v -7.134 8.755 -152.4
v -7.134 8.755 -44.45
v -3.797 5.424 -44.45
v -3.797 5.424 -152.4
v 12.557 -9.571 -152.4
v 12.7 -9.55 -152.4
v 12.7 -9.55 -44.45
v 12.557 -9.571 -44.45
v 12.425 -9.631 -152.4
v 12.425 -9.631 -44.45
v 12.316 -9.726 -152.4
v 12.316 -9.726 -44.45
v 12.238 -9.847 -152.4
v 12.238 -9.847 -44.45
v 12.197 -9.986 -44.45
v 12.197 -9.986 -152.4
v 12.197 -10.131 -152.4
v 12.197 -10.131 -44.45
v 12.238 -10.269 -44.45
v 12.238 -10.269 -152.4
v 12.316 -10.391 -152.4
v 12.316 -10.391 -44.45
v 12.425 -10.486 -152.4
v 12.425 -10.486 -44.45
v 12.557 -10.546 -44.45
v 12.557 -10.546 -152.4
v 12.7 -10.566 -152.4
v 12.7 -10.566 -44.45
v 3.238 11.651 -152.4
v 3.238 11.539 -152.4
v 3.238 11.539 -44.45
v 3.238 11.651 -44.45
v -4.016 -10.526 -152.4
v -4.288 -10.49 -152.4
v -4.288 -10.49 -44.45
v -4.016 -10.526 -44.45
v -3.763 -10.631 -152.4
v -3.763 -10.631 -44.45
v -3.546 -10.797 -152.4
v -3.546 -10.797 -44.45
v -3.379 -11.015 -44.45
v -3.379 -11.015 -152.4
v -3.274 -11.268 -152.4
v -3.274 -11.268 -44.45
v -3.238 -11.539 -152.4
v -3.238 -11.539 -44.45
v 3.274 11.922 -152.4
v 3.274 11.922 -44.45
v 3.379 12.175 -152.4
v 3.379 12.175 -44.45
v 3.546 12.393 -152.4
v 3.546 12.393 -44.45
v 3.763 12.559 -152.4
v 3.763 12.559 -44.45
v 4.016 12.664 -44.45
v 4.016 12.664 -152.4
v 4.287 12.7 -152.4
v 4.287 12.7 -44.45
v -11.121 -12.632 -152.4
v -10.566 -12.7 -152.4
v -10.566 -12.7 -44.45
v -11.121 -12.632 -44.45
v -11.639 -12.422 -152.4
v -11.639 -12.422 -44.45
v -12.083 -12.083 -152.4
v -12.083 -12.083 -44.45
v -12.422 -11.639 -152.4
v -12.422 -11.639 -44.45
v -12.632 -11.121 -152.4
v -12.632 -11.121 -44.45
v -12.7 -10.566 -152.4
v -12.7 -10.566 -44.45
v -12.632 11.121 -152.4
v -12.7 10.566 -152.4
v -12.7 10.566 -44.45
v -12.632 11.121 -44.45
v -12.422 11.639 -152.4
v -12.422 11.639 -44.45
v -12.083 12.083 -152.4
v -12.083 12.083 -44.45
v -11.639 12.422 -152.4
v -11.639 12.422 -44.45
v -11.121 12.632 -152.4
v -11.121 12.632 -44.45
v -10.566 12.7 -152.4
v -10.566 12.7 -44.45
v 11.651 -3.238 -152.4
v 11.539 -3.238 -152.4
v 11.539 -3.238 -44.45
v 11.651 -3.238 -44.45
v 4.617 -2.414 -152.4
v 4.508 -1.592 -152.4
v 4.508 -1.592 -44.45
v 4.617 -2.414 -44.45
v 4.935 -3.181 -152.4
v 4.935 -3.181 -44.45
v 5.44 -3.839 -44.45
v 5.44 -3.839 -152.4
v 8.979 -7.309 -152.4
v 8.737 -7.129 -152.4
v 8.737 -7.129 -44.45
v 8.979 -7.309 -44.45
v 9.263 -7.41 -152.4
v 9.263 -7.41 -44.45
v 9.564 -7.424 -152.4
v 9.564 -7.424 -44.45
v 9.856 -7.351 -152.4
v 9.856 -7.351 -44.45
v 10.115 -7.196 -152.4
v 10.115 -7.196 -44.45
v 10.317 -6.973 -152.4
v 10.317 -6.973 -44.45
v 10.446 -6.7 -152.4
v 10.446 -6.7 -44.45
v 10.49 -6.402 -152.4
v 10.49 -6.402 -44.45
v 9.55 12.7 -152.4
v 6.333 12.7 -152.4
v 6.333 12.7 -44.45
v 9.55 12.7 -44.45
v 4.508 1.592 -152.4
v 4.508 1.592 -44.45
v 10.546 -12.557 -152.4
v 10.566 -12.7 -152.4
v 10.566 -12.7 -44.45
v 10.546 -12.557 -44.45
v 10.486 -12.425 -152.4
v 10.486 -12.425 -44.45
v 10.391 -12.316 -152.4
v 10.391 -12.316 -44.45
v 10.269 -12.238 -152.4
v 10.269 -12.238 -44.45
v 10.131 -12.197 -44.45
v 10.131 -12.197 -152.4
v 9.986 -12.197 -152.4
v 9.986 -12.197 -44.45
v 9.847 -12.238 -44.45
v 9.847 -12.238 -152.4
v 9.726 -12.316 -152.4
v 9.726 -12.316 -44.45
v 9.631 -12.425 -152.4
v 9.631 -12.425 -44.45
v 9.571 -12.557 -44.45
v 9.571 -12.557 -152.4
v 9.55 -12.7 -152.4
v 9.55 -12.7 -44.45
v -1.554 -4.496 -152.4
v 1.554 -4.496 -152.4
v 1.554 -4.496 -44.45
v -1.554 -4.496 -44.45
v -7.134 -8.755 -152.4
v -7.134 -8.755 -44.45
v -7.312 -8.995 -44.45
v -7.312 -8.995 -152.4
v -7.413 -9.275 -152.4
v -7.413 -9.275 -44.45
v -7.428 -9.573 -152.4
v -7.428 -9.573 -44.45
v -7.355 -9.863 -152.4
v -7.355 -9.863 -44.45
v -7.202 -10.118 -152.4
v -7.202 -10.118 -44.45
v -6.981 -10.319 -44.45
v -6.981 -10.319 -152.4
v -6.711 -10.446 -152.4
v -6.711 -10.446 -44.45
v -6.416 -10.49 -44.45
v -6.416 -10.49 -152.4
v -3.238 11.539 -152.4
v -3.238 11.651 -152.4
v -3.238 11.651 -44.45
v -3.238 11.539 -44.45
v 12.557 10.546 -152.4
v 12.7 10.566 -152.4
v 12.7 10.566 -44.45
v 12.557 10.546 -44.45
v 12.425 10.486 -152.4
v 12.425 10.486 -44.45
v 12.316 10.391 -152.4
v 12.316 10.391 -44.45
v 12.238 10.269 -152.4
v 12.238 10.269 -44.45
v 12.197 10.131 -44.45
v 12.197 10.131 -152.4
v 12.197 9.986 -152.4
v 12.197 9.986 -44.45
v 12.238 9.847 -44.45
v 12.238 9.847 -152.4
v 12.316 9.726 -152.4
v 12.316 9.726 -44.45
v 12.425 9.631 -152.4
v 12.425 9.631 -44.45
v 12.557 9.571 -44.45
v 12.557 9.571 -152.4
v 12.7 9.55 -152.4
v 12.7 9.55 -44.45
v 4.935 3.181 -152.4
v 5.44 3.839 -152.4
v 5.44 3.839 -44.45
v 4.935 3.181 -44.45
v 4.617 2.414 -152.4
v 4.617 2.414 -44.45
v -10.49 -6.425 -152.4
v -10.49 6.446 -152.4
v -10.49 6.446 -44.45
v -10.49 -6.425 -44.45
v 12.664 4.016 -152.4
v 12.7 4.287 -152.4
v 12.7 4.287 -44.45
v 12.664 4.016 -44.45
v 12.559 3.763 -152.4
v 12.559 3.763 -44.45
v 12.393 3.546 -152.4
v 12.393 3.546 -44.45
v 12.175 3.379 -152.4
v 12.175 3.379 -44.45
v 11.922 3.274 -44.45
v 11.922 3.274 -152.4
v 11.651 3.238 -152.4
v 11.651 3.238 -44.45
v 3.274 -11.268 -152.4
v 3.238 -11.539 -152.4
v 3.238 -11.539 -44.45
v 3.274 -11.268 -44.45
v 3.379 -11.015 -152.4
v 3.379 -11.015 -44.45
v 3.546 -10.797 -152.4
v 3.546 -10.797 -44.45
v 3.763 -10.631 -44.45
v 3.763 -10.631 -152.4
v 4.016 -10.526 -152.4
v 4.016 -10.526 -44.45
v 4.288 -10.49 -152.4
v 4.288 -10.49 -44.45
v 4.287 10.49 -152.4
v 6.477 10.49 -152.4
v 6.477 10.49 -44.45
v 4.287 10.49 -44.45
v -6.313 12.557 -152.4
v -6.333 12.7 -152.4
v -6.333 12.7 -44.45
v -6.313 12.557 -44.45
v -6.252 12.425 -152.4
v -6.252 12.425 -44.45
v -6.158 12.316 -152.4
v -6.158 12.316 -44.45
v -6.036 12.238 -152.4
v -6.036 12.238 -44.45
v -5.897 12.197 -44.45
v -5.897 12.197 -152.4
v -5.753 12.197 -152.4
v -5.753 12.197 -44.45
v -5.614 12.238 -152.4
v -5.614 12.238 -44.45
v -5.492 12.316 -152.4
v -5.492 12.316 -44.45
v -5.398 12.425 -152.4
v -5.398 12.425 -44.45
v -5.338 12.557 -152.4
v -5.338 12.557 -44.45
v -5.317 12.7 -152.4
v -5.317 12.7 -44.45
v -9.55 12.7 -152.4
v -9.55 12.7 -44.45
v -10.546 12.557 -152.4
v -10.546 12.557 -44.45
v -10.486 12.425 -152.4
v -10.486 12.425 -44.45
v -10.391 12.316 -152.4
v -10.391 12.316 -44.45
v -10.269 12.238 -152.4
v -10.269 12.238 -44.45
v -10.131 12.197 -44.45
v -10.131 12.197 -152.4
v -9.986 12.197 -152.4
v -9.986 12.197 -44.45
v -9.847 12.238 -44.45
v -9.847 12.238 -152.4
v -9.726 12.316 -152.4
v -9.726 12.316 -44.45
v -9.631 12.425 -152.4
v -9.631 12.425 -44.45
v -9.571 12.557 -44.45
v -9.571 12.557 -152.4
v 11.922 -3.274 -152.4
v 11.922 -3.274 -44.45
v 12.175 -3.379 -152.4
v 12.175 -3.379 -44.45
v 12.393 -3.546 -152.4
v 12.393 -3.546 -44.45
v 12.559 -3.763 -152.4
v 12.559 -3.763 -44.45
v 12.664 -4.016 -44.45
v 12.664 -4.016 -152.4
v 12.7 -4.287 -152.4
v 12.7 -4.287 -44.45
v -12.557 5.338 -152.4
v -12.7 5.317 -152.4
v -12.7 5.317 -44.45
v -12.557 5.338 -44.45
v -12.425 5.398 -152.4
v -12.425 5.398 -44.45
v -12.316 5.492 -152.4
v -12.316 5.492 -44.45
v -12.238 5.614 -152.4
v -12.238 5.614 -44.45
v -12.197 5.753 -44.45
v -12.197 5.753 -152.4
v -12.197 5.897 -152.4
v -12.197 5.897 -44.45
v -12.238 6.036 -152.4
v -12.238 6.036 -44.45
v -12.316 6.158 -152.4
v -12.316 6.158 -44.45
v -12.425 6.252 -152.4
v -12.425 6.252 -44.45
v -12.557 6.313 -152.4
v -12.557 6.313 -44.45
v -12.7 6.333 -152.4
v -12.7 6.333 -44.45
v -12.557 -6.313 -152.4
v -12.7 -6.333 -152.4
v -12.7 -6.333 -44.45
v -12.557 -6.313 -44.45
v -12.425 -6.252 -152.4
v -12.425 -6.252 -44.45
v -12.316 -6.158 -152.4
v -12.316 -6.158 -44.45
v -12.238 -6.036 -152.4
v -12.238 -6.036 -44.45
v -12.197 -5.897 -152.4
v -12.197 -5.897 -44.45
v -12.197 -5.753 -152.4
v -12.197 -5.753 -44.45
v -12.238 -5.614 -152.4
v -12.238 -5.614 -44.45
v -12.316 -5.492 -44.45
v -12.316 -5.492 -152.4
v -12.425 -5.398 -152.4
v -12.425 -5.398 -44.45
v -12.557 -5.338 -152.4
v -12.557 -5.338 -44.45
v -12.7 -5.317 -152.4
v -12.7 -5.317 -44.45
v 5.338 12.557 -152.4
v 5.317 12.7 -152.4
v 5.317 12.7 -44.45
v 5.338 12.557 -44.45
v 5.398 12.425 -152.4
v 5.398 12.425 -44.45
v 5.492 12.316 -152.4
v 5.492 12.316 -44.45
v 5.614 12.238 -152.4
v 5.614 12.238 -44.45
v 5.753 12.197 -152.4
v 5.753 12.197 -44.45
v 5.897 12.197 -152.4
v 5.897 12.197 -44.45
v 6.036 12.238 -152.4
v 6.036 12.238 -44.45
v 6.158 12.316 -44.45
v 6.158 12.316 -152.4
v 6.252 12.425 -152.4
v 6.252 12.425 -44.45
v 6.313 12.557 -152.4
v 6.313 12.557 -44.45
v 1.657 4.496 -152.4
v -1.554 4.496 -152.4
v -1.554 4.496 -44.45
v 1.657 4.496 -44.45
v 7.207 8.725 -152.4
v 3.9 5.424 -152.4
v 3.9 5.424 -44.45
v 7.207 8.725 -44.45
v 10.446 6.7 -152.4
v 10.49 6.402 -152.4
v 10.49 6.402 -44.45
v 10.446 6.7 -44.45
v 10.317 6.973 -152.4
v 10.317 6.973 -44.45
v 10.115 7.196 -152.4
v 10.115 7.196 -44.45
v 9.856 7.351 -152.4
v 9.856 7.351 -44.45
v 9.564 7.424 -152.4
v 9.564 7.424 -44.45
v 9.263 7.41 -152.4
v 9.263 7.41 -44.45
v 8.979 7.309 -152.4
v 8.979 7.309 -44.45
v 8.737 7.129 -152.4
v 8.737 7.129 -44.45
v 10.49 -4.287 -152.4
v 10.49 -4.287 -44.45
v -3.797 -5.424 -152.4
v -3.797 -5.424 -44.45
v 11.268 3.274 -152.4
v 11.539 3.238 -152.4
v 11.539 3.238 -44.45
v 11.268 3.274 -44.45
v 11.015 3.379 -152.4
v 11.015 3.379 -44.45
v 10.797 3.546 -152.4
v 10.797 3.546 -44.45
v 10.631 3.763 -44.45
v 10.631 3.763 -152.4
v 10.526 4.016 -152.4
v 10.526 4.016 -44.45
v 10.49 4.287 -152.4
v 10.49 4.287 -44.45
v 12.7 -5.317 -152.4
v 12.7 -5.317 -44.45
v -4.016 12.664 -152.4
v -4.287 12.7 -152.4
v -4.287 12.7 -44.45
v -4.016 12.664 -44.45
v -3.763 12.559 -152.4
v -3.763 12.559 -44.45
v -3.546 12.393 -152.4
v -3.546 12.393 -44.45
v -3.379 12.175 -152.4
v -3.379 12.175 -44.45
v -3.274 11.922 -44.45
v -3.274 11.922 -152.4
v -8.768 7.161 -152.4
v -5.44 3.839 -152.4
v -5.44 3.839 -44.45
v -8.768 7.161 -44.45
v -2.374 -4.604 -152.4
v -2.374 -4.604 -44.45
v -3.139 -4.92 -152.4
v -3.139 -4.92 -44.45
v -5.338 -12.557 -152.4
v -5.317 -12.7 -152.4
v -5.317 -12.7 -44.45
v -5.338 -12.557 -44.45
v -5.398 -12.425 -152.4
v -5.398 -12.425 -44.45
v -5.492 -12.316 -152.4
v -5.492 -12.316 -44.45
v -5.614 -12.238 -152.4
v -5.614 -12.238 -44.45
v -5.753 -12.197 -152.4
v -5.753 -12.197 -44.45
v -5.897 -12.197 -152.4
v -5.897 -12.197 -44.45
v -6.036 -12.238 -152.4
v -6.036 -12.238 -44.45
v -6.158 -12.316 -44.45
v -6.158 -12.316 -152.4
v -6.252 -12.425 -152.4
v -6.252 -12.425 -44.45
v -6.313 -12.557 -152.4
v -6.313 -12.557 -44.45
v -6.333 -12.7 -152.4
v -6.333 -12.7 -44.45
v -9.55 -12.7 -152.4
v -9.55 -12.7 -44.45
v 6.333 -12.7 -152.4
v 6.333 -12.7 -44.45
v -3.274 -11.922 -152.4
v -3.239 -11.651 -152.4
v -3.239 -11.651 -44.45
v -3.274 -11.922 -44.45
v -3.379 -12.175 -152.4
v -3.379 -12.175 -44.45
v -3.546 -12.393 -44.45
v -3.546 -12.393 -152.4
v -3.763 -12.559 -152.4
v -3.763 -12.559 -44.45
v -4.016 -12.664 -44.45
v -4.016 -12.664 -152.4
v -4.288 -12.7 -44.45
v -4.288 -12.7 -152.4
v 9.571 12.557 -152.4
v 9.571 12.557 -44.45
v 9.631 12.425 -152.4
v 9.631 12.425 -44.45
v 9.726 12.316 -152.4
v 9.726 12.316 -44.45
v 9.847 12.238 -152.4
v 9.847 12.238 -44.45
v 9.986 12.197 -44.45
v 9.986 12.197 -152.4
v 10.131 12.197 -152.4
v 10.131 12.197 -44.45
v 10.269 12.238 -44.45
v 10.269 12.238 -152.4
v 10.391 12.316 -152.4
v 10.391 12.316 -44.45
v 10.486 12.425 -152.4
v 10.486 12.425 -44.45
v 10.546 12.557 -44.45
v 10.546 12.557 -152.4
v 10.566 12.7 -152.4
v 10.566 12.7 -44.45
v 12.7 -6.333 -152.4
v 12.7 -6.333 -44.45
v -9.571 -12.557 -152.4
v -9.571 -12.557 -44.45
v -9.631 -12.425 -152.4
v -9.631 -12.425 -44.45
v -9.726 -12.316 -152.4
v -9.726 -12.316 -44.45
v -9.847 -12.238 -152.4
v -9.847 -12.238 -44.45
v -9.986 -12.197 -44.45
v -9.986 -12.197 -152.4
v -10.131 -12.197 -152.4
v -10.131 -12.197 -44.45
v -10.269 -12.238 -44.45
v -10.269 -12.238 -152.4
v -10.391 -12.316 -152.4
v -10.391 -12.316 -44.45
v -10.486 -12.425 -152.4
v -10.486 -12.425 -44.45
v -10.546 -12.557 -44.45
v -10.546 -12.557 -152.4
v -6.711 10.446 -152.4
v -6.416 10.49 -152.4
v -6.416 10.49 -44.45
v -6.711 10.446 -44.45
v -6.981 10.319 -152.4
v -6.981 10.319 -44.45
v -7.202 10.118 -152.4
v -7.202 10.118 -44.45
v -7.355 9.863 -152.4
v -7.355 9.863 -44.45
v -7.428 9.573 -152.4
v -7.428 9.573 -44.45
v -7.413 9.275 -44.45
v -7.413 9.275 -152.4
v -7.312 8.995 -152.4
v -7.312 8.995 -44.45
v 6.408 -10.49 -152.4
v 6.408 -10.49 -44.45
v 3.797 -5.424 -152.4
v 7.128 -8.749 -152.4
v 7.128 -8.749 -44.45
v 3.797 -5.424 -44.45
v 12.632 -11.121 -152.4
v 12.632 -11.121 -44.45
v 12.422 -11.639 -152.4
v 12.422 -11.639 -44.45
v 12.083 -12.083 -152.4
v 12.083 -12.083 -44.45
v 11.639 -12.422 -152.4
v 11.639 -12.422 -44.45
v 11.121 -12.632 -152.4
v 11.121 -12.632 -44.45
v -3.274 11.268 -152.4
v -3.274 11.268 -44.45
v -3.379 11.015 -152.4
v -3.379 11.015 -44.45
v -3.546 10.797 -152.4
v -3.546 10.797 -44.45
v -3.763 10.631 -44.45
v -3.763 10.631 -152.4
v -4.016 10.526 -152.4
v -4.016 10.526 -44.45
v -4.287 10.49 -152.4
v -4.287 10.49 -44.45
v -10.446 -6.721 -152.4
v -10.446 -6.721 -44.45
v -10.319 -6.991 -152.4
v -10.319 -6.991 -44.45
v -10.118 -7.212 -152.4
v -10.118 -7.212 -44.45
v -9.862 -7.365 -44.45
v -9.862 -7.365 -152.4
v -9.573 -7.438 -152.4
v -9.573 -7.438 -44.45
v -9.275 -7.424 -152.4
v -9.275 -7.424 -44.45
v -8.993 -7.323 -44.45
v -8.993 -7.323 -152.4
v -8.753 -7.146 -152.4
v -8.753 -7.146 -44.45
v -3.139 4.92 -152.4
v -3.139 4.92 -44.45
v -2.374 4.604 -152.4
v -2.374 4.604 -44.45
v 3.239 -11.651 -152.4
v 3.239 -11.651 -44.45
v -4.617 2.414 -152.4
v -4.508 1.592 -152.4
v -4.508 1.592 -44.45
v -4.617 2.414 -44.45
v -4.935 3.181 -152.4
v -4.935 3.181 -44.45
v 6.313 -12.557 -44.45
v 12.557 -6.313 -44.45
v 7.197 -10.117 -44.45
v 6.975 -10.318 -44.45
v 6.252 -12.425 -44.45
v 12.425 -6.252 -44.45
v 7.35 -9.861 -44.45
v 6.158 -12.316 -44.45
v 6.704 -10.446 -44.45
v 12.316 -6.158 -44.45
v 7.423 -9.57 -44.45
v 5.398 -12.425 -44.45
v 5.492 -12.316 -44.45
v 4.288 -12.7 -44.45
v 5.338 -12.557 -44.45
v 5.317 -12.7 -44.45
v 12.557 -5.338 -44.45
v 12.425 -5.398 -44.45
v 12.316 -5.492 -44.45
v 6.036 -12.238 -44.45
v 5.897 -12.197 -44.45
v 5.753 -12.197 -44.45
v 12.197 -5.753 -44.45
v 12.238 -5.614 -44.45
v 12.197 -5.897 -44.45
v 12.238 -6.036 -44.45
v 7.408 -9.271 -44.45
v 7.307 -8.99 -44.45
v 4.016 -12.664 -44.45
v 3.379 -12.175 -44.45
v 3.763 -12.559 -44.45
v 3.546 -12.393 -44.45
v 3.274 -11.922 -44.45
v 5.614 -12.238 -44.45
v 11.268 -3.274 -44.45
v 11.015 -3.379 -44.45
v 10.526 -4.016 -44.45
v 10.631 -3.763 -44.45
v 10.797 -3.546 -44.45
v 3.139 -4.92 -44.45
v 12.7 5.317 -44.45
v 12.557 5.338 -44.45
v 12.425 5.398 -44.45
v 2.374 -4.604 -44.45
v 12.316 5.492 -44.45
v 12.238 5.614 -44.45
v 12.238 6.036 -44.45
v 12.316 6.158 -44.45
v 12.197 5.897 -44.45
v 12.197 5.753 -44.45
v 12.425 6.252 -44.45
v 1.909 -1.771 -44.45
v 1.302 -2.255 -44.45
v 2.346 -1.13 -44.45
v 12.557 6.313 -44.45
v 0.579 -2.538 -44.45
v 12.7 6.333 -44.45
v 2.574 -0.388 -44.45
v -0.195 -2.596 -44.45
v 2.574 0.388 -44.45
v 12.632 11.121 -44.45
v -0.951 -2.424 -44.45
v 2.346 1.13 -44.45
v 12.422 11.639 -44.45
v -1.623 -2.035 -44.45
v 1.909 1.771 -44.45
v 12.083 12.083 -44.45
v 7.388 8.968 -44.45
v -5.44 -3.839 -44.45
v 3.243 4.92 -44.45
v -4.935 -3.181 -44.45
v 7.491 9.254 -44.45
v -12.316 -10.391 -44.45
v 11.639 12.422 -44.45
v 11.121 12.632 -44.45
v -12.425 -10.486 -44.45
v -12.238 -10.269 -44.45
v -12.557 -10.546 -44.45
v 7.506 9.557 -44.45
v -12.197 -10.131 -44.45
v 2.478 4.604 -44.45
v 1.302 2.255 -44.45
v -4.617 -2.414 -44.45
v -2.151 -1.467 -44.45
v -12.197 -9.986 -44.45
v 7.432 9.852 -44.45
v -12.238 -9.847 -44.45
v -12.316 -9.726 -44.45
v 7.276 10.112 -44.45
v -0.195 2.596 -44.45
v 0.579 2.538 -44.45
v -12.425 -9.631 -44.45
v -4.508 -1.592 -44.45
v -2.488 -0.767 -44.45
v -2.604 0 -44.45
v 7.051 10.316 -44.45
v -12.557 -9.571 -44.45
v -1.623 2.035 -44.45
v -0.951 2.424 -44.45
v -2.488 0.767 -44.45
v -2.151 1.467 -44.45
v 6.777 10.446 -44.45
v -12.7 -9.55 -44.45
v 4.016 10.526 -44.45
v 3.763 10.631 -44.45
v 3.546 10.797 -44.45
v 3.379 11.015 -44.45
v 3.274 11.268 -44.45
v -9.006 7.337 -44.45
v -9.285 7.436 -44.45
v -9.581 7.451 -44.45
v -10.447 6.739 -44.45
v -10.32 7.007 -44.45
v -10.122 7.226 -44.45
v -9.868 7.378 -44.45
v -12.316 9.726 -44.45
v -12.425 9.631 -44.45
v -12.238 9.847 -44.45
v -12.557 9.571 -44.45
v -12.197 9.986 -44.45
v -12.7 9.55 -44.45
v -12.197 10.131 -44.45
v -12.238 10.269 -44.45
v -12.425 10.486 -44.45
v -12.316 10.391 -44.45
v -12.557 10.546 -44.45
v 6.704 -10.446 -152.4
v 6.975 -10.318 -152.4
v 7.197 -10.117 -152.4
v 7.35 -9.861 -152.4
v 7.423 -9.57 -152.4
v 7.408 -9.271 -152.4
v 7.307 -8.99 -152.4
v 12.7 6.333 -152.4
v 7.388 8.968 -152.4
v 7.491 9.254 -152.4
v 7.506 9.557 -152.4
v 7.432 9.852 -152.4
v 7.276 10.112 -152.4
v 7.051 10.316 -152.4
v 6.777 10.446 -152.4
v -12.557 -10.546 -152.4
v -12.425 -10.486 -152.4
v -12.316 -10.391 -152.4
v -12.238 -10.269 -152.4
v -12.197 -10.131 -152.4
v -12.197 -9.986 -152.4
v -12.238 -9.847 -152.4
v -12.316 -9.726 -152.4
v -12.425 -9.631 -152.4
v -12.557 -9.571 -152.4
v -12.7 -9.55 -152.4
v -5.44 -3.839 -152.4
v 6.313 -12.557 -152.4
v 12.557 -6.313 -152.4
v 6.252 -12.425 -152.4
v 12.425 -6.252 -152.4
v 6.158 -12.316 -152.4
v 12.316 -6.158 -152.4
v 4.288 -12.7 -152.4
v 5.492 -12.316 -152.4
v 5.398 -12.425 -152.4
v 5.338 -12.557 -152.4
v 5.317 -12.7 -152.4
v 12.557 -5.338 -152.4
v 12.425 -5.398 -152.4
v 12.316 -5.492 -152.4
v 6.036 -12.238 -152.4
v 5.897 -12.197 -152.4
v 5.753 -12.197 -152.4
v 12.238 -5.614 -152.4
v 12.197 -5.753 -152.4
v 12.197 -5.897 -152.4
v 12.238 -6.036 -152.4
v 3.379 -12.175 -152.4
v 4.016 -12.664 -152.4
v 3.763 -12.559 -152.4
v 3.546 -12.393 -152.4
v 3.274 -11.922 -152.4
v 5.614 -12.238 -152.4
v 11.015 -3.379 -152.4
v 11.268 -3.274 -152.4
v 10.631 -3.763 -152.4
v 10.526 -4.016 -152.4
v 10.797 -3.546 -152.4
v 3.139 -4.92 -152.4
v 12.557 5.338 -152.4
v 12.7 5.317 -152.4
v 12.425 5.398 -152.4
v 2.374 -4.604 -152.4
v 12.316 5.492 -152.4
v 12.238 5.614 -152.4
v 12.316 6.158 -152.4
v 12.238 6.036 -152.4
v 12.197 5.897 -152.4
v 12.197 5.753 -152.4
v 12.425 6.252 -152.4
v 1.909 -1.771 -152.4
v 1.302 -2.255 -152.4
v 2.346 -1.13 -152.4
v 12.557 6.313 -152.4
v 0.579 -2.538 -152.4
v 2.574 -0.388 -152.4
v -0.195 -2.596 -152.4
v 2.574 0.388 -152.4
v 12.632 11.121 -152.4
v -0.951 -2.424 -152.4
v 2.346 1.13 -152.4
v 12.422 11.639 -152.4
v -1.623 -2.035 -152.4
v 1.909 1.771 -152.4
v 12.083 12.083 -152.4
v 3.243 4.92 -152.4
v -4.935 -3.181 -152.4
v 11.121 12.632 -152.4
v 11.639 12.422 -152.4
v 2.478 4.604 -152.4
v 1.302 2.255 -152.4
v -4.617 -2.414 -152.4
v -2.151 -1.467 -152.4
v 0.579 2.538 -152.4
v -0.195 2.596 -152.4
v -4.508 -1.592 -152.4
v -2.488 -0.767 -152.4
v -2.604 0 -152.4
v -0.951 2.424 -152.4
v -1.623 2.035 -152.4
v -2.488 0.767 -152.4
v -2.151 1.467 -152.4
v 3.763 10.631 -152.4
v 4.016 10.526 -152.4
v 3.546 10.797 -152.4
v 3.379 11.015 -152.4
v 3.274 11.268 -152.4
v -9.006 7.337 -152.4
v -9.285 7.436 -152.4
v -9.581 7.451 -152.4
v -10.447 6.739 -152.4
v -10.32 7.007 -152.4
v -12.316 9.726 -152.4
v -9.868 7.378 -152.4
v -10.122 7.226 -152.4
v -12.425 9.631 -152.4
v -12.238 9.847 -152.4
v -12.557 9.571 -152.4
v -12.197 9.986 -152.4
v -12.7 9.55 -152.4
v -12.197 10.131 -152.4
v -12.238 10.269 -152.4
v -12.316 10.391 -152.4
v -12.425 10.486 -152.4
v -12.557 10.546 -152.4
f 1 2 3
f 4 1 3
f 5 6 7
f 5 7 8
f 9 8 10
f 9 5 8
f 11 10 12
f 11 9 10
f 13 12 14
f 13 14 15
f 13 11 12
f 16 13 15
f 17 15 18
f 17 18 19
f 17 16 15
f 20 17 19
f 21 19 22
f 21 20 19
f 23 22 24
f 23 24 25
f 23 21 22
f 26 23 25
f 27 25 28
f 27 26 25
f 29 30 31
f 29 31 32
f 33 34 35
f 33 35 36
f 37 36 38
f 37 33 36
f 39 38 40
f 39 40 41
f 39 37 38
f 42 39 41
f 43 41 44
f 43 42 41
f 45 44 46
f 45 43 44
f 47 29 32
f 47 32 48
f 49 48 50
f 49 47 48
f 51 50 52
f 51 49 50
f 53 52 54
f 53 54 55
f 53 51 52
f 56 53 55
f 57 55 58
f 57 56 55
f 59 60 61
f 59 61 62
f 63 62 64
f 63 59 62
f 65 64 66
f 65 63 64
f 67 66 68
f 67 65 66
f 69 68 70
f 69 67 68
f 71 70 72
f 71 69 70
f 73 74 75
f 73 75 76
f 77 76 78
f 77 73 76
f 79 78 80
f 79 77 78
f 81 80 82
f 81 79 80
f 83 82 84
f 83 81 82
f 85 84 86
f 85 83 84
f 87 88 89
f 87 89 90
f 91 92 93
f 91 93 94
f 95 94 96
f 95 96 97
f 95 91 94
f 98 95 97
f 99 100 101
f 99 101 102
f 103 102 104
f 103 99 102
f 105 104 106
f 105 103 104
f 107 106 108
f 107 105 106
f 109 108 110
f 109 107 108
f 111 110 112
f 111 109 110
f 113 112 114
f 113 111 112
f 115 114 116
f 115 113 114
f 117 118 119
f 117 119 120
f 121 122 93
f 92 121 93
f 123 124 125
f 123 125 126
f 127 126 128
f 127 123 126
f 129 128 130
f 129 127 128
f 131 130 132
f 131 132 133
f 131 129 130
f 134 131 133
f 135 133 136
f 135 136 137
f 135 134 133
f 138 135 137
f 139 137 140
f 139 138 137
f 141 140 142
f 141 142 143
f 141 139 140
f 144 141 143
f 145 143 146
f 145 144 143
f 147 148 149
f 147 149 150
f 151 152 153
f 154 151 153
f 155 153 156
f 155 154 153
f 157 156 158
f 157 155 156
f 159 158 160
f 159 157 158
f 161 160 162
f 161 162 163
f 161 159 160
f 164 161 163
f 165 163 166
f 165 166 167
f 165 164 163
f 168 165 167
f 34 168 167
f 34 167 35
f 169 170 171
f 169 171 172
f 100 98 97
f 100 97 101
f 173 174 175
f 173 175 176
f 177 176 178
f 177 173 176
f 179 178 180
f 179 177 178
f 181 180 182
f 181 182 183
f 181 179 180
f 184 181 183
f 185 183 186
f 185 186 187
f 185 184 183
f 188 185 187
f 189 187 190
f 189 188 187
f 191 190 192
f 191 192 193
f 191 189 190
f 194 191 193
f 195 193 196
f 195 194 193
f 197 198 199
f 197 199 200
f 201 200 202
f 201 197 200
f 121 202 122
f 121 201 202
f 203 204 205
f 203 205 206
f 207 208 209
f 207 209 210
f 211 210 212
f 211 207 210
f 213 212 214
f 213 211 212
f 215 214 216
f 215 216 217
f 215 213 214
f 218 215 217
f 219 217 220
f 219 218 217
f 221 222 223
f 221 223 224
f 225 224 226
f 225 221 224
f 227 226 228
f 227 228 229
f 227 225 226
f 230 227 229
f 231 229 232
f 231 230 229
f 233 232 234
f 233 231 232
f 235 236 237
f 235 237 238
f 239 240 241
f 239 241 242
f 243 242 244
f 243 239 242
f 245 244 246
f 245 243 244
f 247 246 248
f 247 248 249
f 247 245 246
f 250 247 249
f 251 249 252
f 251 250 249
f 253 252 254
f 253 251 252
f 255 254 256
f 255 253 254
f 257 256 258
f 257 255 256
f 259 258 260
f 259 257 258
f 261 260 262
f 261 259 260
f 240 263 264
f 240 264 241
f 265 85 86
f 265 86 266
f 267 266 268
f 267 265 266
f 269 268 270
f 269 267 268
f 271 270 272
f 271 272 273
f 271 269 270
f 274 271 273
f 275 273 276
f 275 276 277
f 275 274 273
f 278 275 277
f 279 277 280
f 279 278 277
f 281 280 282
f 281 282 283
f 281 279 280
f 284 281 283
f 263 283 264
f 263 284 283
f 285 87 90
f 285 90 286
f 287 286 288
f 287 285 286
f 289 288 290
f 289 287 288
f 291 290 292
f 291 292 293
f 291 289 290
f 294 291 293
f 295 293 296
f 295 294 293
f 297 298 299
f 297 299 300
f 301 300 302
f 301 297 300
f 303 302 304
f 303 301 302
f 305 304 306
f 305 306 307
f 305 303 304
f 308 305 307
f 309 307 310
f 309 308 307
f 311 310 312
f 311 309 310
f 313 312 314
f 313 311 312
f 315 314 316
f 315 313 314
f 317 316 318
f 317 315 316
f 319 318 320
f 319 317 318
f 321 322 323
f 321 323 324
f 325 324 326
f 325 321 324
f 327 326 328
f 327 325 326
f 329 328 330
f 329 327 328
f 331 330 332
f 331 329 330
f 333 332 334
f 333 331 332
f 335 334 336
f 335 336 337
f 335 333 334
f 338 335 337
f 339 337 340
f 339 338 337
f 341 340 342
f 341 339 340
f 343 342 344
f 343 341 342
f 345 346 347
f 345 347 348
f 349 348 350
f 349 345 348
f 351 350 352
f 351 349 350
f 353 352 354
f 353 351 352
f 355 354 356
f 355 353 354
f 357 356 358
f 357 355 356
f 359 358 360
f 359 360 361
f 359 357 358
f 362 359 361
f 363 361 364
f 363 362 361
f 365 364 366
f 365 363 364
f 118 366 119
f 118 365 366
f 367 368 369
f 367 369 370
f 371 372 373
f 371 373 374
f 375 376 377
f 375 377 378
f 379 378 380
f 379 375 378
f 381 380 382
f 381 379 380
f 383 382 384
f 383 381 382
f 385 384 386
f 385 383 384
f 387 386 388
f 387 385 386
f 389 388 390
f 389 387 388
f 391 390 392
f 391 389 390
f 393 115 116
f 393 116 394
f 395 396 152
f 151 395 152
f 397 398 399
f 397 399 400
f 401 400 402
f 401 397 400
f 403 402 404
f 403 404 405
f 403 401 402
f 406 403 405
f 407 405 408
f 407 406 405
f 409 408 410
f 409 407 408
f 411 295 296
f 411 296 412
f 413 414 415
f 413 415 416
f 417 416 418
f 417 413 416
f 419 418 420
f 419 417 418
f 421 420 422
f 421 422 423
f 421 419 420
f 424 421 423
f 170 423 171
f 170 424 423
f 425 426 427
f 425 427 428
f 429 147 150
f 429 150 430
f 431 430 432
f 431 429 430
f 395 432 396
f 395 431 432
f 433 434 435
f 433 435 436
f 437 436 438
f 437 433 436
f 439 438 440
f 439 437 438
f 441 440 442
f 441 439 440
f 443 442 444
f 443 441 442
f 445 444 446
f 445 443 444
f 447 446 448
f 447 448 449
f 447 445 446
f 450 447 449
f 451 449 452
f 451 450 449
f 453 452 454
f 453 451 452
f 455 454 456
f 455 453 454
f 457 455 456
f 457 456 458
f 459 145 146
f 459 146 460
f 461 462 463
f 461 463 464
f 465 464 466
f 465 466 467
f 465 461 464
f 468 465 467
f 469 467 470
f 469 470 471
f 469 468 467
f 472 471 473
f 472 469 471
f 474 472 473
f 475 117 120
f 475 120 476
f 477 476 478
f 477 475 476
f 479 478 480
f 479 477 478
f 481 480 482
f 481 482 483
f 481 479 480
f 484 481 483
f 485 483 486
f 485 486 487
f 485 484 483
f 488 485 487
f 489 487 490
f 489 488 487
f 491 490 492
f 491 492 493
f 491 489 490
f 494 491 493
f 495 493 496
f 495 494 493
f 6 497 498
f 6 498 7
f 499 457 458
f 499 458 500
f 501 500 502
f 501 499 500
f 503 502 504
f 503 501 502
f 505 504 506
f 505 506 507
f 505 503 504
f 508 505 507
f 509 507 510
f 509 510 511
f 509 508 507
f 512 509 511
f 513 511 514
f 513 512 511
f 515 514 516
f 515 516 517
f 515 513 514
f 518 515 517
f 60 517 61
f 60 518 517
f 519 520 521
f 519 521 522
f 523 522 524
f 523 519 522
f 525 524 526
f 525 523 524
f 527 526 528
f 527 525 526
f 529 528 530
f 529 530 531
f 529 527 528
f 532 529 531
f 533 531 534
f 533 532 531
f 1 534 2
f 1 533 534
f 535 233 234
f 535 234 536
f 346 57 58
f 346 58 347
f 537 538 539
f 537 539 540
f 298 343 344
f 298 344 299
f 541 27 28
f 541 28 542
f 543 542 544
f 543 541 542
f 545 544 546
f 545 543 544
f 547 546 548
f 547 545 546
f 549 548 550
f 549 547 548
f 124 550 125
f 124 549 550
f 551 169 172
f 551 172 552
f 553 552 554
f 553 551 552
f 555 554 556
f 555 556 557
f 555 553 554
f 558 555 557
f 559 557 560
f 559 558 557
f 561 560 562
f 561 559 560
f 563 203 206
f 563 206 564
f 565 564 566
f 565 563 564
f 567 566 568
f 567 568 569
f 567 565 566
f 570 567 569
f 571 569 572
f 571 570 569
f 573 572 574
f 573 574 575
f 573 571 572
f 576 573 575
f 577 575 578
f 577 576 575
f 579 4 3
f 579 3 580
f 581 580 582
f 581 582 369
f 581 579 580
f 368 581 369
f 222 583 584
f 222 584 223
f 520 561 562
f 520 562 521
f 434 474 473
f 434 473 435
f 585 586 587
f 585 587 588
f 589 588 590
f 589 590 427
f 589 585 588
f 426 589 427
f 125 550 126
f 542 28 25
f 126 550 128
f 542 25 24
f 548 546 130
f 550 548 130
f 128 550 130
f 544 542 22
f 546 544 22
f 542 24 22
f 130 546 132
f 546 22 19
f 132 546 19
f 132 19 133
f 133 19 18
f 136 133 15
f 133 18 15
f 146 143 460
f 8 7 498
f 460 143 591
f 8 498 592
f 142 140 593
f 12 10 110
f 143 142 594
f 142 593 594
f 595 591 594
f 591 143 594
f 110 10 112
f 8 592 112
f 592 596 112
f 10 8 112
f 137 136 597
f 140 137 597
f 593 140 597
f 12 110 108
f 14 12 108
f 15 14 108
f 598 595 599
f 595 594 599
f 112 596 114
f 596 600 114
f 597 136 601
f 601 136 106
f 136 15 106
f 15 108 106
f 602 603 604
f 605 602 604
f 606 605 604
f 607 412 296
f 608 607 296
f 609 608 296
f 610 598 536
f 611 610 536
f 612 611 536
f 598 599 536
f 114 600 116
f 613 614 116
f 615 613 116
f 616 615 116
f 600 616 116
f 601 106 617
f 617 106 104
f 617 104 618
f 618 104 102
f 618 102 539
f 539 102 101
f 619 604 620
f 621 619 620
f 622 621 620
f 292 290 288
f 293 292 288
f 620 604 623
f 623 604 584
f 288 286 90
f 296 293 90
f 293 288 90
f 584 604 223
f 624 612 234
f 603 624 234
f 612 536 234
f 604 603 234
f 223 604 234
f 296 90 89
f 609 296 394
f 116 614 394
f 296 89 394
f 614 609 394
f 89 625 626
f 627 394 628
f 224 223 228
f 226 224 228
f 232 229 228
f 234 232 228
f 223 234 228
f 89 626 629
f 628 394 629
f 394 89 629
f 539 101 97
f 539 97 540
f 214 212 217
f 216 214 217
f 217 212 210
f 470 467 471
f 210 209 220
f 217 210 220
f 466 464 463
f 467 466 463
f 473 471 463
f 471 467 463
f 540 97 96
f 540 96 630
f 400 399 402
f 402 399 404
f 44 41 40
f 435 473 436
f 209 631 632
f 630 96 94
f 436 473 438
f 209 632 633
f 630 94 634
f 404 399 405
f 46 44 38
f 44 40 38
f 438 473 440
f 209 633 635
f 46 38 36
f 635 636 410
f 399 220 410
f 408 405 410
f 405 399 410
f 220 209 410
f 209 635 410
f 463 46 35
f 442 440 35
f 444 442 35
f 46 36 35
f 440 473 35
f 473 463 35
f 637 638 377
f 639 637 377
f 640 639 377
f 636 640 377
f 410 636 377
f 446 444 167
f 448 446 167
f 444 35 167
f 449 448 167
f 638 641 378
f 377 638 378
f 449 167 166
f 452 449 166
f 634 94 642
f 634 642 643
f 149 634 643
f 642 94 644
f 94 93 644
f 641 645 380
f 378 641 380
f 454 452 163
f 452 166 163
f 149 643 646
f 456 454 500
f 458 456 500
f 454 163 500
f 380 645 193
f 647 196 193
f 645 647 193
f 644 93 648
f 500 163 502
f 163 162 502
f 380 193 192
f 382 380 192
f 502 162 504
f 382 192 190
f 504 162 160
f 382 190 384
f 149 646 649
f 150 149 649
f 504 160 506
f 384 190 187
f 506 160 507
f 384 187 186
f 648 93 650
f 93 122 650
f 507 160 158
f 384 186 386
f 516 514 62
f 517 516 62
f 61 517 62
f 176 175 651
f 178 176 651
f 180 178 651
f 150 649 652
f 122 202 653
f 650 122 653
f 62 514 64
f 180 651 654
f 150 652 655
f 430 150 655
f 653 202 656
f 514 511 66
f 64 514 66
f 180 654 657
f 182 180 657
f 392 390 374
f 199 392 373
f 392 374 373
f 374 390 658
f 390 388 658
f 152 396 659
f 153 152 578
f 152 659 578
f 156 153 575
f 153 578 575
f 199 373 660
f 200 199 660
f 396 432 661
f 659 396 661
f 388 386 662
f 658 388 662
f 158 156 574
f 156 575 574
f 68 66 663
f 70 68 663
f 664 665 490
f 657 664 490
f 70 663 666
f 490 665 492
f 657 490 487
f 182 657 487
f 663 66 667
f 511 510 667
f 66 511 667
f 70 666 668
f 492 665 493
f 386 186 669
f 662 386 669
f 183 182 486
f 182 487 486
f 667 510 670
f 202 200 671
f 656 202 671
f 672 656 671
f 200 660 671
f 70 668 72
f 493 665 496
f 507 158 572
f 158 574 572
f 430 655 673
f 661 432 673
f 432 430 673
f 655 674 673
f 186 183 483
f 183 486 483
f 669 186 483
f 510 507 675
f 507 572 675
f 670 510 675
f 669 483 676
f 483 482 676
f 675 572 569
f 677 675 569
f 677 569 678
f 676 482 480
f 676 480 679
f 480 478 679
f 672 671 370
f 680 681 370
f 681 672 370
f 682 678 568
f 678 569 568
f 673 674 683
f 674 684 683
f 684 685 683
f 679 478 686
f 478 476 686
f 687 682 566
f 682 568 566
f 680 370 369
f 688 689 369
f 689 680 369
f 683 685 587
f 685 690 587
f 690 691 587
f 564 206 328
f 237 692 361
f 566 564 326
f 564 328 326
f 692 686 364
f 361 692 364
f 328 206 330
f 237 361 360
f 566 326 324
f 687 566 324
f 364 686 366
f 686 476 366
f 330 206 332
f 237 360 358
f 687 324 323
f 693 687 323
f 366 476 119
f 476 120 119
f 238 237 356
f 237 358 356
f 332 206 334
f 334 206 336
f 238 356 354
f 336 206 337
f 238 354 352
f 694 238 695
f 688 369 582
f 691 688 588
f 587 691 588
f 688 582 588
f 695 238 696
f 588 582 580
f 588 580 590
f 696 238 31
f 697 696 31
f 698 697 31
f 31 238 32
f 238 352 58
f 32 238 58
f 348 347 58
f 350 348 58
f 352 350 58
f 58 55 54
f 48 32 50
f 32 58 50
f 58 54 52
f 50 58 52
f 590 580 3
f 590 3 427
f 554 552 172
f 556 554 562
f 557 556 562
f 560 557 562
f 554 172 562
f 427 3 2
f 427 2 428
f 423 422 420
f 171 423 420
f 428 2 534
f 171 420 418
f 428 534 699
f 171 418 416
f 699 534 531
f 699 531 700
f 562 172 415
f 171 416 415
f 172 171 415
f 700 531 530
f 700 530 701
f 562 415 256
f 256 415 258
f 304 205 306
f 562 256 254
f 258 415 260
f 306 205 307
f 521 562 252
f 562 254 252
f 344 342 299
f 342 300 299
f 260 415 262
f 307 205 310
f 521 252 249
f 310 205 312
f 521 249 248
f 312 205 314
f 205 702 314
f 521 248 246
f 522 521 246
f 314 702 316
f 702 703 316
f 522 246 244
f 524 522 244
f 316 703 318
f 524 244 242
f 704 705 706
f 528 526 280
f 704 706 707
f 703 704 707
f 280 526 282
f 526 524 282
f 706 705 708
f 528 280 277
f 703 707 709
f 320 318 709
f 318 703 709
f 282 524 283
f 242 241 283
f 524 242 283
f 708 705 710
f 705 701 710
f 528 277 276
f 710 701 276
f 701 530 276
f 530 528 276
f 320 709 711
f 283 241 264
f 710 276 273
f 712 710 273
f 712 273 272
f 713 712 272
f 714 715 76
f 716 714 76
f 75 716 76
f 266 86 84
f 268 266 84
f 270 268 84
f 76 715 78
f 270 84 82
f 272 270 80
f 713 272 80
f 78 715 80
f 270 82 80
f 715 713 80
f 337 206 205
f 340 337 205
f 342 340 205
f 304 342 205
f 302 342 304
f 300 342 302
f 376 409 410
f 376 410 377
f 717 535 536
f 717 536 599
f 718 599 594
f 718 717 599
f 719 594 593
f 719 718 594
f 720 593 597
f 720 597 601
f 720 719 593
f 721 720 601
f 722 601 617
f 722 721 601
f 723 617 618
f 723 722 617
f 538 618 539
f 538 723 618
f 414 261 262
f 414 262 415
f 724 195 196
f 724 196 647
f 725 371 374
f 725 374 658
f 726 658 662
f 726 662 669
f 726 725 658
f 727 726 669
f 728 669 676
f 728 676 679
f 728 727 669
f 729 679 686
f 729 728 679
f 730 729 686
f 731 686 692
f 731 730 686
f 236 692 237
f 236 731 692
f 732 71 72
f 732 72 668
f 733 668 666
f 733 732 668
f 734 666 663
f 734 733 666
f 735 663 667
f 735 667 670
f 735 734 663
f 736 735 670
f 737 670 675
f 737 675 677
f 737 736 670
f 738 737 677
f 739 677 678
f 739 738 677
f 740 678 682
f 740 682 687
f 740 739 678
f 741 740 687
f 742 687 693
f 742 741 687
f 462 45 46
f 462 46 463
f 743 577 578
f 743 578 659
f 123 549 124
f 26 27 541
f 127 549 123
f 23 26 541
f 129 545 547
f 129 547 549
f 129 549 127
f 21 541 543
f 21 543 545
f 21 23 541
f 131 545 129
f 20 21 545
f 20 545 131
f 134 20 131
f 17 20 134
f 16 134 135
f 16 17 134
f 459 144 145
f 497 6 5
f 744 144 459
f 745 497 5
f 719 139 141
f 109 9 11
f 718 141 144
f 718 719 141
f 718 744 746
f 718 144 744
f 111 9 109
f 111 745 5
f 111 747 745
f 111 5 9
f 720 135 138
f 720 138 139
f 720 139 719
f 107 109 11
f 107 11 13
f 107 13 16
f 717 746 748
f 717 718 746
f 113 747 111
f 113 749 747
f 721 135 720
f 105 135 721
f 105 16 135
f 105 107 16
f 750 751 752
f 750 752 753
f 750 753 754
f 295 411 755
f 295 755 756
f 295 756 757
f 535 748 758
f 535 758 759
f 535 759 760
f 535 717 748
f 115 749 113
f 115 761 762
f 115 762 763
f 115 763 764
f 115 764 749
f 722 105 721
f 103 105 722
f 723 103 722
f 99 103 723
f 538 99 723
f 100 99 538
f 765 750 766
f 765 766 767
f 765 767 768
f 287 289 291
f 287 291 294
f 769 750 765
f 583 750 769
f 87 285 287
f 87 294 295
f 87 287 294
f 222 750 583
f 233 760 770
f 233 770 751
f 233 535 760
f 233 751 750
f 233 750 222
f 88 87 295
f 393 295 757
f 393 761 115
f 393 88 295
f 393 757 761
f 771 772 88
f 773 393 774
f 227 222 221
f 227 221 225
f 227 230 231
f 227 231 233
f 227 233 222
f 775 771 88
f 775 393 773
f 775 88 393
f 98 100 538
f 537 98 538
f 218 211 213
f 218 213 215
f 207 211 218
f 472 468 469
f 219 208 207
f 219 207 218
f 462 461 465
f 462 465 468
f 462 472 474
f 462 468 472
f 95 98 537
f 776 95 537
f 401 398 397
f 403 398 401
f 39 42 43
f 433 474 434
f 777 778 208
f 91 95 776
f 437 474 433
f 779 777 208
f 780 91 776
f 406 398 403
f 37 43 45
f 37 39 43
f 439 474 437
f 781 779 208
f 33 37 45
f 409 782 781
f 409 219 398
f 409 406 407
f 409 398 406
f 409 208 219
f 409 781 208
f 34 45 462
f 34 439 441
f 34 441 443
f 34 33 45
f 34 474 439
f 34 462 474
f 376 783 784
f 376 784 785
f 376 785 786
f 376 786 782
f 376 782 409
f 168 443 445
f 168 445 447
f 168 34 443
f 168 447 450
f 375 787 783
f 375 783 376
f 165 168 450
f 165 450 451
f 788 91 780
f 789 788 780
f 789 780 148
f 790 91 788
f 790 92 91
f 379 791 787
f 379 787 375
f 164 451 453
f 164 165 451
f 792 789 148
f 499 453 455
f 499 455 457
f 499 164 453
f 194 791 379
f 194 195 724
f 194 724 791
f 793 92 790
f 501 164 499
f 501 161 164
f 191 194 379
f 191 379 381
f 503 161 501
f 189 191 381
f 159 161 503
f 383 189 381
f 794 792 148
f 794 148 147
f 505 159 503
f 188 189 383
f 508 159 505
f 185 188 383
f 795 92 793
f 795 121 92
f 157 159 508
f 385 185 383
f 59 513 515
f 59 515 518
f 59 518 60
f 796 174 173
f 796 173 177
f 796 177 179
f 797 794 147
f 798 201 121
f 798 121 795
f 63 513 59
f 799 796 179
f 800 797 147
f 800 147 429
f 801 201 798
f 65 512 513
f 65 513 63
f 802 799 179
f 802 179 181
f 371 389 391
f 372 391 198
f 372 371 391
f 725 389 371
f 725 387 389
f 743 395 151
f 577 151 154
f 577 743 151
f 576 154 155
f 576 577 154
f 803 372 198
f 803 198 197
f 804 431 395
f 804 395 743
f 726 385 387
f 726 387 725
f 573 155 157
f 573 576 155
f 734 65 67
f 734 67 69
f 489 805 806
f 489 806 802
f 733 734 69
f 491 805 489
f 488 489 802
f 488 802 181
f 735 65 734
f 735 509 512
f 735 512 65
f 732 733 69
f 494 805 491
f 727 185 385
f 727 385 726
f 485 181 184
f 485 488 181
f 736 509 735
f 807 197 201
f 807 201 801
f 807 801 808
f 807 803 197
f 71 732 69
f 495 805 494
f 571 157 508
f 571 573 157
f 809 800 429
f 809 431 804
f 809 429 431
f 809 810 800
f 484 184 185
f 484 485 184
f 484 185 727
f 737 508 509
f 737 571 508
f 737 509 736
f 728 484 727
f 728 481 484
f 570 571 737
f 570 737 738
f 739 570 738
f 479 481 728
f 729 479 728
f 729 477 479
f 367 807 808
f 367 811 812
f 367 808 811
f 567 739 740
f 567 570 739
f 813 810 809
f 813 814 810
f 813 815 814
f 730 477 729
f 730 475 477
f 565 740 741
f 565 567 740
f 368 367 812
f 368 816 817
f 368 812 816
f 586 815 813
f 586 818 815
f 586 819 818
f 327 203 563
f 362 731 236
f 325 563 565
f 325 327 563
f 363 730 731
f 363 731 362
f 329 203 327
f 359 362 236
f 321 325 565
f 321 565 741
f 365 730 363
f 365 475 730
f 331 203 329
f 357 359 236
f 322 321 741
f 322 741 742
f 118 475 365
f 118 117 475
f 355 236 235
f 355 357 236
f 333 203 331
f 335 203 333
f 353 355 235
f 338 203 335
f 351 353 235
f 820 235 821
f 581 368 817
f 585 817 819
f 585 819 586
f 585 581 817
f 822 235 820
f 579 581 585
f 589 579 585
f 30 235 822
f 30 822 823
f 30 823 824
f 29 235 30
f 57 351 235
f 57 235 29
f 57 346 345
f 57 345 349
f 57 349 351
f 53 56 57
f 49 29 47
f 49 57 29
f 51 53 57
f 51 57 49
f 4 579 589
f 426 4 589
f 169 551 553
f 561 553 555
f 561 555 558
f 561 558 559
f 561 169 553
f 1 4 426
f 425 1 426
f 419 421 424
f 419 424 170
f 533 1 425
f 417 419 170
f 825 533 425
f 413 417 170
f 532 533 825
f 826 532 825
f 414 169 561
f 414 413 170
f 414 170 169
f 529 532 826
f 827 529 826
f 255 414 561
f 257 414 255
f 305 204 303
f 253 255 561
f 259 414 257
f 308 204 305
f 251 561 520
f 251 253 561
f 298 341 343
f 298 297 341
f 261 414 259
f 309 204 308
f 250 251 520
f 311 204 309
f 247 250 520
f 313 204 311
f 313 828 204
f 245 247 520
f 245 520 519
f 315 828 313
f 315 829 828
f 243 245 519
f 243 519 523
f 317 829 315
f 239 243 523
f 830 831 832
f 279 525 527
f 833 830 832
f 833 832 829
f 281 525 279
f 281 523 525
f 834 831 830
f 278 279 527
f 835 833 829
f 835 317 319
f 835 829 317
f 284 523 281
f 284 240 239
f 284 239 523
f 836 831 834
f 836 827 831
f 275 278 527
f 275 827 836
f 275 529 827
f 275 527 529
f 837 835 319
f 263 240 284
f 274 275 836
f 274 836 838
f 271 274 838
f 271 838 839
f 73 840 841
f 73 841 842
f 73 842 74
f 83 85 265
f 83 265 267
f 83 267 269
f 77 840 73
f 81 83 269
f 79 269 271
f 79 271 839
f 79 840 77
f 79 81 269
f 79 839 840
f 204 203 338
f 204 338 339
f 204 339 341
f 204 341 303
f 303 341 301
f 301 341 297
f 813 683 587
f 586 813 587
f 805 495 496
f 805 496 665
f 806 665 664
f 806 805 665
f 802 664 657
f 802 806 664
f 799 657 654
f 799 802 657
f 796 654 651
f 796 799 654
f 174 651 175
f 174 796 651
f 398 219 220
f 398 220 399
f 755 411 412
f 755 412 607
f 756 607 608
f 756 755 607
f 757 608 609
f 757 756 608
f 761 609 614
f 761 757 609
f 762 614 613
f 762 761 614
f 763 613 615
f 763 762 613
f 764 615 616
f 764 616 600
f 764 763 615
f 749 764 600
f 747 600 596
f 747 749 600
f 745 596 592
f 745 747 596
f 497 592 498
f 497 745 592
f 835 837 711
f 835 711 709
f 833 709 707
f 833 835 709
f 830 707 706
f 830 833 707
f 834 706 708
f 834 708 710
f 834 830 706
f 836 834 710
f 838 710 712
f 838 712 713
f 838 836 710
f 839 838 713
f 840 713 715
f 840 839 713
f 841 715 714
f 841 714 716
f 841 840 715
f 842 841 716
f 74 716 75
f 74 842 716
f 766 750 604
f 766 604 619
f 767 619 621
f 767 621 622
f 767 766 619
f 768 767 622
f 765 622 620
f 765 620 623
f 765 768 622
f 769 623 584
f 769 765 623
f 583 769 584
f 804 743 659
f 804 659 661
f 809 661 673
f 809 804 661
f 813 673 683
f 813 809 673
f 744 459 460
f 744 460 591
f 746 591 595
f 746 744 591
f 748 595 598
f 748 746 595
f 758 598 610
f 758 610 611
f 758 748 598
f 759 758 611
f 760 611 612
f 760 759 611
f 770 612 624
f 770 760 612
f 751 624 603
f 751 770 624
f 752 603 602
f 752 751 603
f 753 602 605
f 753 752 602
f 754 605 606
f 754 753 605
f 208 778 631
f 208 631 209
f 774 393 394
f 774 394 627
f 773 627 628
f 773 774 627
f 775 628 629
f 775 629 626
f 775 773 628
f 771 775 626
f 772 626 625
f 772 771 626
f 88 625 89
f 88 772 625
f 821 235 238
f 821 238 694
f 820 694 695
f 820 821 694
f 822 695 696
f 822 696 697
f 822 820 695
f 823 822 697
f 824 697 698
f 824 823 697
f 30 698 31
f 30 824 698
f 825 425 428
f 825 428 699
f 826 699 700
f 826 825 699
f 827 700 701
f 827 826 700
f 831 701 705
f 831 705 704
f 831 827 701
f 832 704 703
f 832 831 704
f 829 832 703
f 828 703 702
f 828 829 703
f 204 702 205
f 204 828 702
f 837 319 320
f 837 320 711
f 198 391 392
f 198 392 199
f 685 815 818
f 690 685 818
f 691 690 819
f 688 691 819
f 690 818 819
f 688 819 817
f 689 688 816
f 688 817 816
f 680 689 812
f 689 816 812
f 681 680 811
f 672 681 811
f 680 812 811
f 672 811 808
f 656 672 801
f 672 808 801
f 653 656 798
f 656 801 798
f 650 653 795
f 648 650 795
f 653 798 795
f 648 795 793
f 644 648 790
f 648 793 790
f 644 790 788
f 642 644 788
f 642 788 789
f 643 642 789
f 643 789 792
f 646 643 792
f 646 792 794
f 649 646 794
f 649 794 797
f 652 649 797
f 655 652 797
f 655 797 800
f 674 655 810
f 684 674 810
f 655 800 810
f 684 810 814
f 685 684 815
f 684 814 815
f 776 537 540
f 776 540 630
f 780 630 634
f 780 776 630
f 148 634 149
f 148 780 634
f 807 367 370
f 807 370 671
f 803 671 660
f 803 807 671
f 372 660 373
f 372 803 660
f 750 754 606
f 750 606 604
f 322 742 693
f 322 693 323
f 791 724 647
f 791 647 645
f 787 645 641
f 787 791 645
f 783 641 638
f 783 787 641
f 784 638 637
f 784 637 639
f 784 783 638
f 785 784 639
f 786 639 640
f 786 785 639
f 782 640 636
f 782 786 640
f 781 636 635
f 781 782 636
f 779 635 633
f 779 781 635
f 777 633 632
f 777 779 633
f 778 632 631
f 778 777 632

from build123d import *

# Parameters (mm, degrees)
SKETCH1_R           = 2.6035
BOSS_EXTRUDE1_DEPTH = 107.95


with BuildPart() as part:
    # Sketch1 → Boss-Extrude1 (new body)
    with BuildSketch(Plane(origin=(0, 0, -152.4), x_dir=(-1, 0, 0), z_dir=(0, 0, -1))):
        with BuildLine():
            Line((6.416409763, -10.4902), (4.28752, -10.4902))
            ThreePointArc((4.28752, -10.4902), (3.545750844, -10.797450844), (3.2385, -11.53922))
            Line((3.2385, -11.53922), (3.2385, -11.65098))
            ThreePointArc((3.2385, -11.65098), (3.545750844, -12.392749156), (4.28752, -12.7))
            Line((4.28752, -12.7), (5.3170836, -12.7))
            ThreePointArc((5.3170836, -12.7), (5.8250836, -12.192), (6.3330836, -12.7))
            Line((6.3330836, -12.7), (9.5504, -12.7))
            ThreePointArc((9.5504, -12.7), (10.058323491, -12.192000006), (10.566399977, -12.699846982))
            ThreePointArc((10.566399977, -12.699846982), (12.082522516, -12.082522516), (12.699846982, -10.566399977))
            ThreePointArc((12.699846982, -10.566399977), (12.192000006, -10.058323491), (12.7, -9.5504))
            Line((12.7, -9.5504), (12.7, -6.3330836))
            ThreePointArc((12.7, -6.3330836), (12.192, -5.8250836), (12.7, -5.3170836))
            Line((12.7, -5.3170836), (12.7, 5.3171344))
            ThreePointArc((12.7, 5.3171344), (12.192, 5.8251344), (12.7, 6.3331344))
            Line((12.7, 6.3331344), (12.7, 9.5504))
            ThreePointArc((12.7, 9.5504), (12.192000006, 10.058323491), (12.699846982, 10.566399977))
            ThreePointArc((12.699846982, 10.566399977), (12.082522516, 12.082522516), (10.566399977, 12.699846982))
            ThreePointArc((10.566399977, 12.699846982), (10.058323491, 12.192000006), (9.5504, 12.7))
            Line((9.5504, 12.7), (6.3331344, 12.7))
            ThreePointArc((6.3331344, 12.7), (5.8251344, 12.192), (5.3171344, 12.7))
            Line((5.3171344, 12.7), (4.2874692, 12.7))
            ThreePointArc((4.2874692, 12.7), (3.545700044, 12.392749156), (3.2384492, 11.65098))
            Line((3.2384492, 11.65098), (3.2384492, 11.53922))
            ThreePointArc((3.2384492, 11.53922), (3.545700044, 10.797450844), (4.2874692, 10.4902))
            Line((4.2874692, 10.4902), (6.416384363, 10.4902))
            ThreePointArc((6.416384363, 10.4902), (7.355223148, 9.862578342), (7.134149423, 8.755124678))
            Line((7.134149423, 8.755124678), (3.796632915, 5.423689619))
            ThreePointArc((3.796632915, 5.423689619), (2.767299421, 4.736928798), (1.553617102, 4.4958))
            Line((1.553617102, 4.4958), (-1.657299581, 4.4958))
            ThreePointArc((-1.657299581, 4.4958), (-2.8709819, 4.736928798), (-3.900315394, 5.423689619))
            Line((-3.900315394, 5.423689619), (-7.207191475, 8.724540082))
            ThreePointArc((-7.207191475, 8.724540082), (-7.43216212, 9.851515102), (-6.476774195, 10.4902))
            Line((-6.476774195, 10.4902), (-4.2874692, 10.4902))
            ThreePointArc((-4.2874692, 10.4902), (-3.545700044, 10.797450844), (-3.2384492, 11.53922))
            Line((-3.2384492, 11.53922), (-3.2384492, 11.65098))
            ThreePointArc((-3.2384492, 11.65098), (-3.545700044, 12.392749156), (-4.2874692, 12.7))
            Line((-4.2874692, 12.7), (-5.3170836, 12.7))
            ThreePointArc((-5.3170836, 12.7), (-5.8250836, 12.192), (-6.3330836, 12.7))
            Line((-6.3330836, 12.7), (-9.5504, 12.7))
            ThreePointArc((-9.5504, 12.7), (-10.058323491, 12.192000006), (-10.566399977, 12.699846982))
            ThreePointArc((-10.566399977, 12.699846982), (-12.082522516, 12.082522516), (-12.699846982, 10.566399977))
            ThreePointArc((-12.699846982, 10.566399977), (-12.192000006, 10.058323491), (-12.7, 9.5504))
            Line((-12.7, 9.5504), (-12.7, 6.3331344))
            ThreePointArc((-12.7, 6.3331344), (-12.192, 5.8251344), (-12.7, 5.3171344))
            Line((-12.7, 5.3171344), (-12.7, 4.287470133))
            ThreePointArc((-12.7, 4.287470133), (-12.392749156, 3.545700977), (-11.65098, 3.238450133))
            Line((-11.65098, 3.238450133), (-11.53922, 3.238450133))
            ThreePointArc((-11.53922, 3.238450133), (-10.797450844, 3.545700977), (-10.4902, 4.287470133))
            Line((-10.4902, 4.287470133), (-10.4902, 6.402089023))
            ThreePointArc((-10.4902, 6.402089023), (-9.856394933, 7.351113629), (-8.736962546, 7.129240479))
            Line((-8.736962546, 7.129240479), (-5.440484187, 3.838768792))
            ThreePointArc((-5.440484187, 3.838768792), (-4.75073678, 2.808015636), (-4.5085, 1.591658411))
            Line((-4.5085, 1.591658411), (-4.5085, -1.591658411))
            ThreePointArc((-4.5085, -1.591658411), (-4.75073678, -2.808015636), (-5.440484187, -3.838768792))
            Line((-5.440484187, -3.838768792), (-8.736962546, -7.129240479))
            ThreePointArc((-8.736962546, -7.129240479), (-9.856394933, -7.351113629), (-10.4902, -6.402089023))
            Line((-10.4902, -6.402089023), (-10.4902, -4.287470133))
            ThreePointArc((-10.4902, -4.287470133), (-10.797450844, -3.545700977), (-11.53922, -3.238450133))
            Line((-11.53922, -3.238450133), (-11.65098, -3.238450133))
            ThreePointArc((-11.65098, -3.238450133), (-12.392749156, -3.545700977), (-12.7, -4.287470133))
            Line((-12.7, -4.287470133), (-12.7, -5.3170836))
            ThreePointArc((-12.7, -5.3170836), (-12.192, -5.8250836), (-12.7, -6.3330836))
            Line((-12.7, -6.3330836), (-12.7, -9.5504))
            ThreePointArc((-12.7, -9.5504), (-12.192000006, -10.058323491), (-12.699846982, -10.566399977))
            ThreePointArc((-12.699846982, -10.566399977), (-12.082522516, -12.082522516), (-10.566399977, -12.699846982))
            ThreePointArc((-10.566399977, -12.699846982), (-10.058323491, -12.192000006), (-9.5504, -12.7))
            Line((-9.5504, -12.7), (-6.3331344, -12.7))
            ThreePointArc((-6.3331344, -12.7), (-5.8251344, -12.192), (-5.3171344, -12.7))
            Line((-5.3171344, -12.7), (-4.28752, -12.7))
            ThreePointArc((-4.28752, -12.7), (-3.545750844, -12.392749156), (-3.2385, -11.65098))
            Line((-3.2385, -11.65098), (-3.2385, -11.53922))
            ThreePointArc((-3.2385, -11.53922), (-3.545750844, -10.797450844), (-4.28752, -10.4902))
            Line((-4.28752, -10.4902), (-6.40834956, -10.4902))
            ThreePointArc((-6.40834956, -10.4902), (-7.350269456, -9.860518594), (-7.128470204, -8.749430454))
            Line((-7.128470204, -8.749430454), (-3.796658315, -5.423689619))
            ThreePointArc((-3.796658315, -5.423689619), (-2.767324821, -4.736928798), (-1.553642502, -4.4958))
            Line((-1.553642502, -4.4958), (1.553642502, -4.4958))
            ThreePointArc((1.553642502, -4.4958), (2.767324821, -4.736928798), (3.796658315, -5.423689619))
            Line((3.796658315, -5.423689619), (7.134174823, -8.755124678))
            ThreePointArc((7.134174823, -8.755124678), (7.355248548, -9.862578342), (6.416409763, -10.4902))
        make_face()
        Circle(SKETCH1_R, mode=Mode.SUBTRACT)
        with BuildLine():
            Line((10.4902, 6.446436794), (10.4902, -6.425372487))
            ThreePointArc((10.4902, -6.425372487), (9.862352148, -7.36547709), (8.753441447, -7.145689354))
            Line((8.753441447, -7.145689354), (5.440484187, -3.838768792))
            ThreePointArc((5.440484187, -3.838768792), (4.75073678, -2.808015636), (4.5085, -1.591658411))
            Line((4.5085, -1.591658411), (4.5085, 1.591658411))
            ThreePointArc((4.5085, 1.591658411), (4.75073678, 2.808015636), (5.440484187, 3.838768792))
            Line((5.440484187, 3.838768792), (8.768349738, 7.160570479))
            ThreePointArc((8.768349738, 7.160570479), (9.867741577, 7.378471563), (10.4902, 6.446436794))
        make_face(mode=Mode.SUBTRACT)
    extrude(amount=-BOSS_EXTRUDE1_DEPTH)


solid = part.part
